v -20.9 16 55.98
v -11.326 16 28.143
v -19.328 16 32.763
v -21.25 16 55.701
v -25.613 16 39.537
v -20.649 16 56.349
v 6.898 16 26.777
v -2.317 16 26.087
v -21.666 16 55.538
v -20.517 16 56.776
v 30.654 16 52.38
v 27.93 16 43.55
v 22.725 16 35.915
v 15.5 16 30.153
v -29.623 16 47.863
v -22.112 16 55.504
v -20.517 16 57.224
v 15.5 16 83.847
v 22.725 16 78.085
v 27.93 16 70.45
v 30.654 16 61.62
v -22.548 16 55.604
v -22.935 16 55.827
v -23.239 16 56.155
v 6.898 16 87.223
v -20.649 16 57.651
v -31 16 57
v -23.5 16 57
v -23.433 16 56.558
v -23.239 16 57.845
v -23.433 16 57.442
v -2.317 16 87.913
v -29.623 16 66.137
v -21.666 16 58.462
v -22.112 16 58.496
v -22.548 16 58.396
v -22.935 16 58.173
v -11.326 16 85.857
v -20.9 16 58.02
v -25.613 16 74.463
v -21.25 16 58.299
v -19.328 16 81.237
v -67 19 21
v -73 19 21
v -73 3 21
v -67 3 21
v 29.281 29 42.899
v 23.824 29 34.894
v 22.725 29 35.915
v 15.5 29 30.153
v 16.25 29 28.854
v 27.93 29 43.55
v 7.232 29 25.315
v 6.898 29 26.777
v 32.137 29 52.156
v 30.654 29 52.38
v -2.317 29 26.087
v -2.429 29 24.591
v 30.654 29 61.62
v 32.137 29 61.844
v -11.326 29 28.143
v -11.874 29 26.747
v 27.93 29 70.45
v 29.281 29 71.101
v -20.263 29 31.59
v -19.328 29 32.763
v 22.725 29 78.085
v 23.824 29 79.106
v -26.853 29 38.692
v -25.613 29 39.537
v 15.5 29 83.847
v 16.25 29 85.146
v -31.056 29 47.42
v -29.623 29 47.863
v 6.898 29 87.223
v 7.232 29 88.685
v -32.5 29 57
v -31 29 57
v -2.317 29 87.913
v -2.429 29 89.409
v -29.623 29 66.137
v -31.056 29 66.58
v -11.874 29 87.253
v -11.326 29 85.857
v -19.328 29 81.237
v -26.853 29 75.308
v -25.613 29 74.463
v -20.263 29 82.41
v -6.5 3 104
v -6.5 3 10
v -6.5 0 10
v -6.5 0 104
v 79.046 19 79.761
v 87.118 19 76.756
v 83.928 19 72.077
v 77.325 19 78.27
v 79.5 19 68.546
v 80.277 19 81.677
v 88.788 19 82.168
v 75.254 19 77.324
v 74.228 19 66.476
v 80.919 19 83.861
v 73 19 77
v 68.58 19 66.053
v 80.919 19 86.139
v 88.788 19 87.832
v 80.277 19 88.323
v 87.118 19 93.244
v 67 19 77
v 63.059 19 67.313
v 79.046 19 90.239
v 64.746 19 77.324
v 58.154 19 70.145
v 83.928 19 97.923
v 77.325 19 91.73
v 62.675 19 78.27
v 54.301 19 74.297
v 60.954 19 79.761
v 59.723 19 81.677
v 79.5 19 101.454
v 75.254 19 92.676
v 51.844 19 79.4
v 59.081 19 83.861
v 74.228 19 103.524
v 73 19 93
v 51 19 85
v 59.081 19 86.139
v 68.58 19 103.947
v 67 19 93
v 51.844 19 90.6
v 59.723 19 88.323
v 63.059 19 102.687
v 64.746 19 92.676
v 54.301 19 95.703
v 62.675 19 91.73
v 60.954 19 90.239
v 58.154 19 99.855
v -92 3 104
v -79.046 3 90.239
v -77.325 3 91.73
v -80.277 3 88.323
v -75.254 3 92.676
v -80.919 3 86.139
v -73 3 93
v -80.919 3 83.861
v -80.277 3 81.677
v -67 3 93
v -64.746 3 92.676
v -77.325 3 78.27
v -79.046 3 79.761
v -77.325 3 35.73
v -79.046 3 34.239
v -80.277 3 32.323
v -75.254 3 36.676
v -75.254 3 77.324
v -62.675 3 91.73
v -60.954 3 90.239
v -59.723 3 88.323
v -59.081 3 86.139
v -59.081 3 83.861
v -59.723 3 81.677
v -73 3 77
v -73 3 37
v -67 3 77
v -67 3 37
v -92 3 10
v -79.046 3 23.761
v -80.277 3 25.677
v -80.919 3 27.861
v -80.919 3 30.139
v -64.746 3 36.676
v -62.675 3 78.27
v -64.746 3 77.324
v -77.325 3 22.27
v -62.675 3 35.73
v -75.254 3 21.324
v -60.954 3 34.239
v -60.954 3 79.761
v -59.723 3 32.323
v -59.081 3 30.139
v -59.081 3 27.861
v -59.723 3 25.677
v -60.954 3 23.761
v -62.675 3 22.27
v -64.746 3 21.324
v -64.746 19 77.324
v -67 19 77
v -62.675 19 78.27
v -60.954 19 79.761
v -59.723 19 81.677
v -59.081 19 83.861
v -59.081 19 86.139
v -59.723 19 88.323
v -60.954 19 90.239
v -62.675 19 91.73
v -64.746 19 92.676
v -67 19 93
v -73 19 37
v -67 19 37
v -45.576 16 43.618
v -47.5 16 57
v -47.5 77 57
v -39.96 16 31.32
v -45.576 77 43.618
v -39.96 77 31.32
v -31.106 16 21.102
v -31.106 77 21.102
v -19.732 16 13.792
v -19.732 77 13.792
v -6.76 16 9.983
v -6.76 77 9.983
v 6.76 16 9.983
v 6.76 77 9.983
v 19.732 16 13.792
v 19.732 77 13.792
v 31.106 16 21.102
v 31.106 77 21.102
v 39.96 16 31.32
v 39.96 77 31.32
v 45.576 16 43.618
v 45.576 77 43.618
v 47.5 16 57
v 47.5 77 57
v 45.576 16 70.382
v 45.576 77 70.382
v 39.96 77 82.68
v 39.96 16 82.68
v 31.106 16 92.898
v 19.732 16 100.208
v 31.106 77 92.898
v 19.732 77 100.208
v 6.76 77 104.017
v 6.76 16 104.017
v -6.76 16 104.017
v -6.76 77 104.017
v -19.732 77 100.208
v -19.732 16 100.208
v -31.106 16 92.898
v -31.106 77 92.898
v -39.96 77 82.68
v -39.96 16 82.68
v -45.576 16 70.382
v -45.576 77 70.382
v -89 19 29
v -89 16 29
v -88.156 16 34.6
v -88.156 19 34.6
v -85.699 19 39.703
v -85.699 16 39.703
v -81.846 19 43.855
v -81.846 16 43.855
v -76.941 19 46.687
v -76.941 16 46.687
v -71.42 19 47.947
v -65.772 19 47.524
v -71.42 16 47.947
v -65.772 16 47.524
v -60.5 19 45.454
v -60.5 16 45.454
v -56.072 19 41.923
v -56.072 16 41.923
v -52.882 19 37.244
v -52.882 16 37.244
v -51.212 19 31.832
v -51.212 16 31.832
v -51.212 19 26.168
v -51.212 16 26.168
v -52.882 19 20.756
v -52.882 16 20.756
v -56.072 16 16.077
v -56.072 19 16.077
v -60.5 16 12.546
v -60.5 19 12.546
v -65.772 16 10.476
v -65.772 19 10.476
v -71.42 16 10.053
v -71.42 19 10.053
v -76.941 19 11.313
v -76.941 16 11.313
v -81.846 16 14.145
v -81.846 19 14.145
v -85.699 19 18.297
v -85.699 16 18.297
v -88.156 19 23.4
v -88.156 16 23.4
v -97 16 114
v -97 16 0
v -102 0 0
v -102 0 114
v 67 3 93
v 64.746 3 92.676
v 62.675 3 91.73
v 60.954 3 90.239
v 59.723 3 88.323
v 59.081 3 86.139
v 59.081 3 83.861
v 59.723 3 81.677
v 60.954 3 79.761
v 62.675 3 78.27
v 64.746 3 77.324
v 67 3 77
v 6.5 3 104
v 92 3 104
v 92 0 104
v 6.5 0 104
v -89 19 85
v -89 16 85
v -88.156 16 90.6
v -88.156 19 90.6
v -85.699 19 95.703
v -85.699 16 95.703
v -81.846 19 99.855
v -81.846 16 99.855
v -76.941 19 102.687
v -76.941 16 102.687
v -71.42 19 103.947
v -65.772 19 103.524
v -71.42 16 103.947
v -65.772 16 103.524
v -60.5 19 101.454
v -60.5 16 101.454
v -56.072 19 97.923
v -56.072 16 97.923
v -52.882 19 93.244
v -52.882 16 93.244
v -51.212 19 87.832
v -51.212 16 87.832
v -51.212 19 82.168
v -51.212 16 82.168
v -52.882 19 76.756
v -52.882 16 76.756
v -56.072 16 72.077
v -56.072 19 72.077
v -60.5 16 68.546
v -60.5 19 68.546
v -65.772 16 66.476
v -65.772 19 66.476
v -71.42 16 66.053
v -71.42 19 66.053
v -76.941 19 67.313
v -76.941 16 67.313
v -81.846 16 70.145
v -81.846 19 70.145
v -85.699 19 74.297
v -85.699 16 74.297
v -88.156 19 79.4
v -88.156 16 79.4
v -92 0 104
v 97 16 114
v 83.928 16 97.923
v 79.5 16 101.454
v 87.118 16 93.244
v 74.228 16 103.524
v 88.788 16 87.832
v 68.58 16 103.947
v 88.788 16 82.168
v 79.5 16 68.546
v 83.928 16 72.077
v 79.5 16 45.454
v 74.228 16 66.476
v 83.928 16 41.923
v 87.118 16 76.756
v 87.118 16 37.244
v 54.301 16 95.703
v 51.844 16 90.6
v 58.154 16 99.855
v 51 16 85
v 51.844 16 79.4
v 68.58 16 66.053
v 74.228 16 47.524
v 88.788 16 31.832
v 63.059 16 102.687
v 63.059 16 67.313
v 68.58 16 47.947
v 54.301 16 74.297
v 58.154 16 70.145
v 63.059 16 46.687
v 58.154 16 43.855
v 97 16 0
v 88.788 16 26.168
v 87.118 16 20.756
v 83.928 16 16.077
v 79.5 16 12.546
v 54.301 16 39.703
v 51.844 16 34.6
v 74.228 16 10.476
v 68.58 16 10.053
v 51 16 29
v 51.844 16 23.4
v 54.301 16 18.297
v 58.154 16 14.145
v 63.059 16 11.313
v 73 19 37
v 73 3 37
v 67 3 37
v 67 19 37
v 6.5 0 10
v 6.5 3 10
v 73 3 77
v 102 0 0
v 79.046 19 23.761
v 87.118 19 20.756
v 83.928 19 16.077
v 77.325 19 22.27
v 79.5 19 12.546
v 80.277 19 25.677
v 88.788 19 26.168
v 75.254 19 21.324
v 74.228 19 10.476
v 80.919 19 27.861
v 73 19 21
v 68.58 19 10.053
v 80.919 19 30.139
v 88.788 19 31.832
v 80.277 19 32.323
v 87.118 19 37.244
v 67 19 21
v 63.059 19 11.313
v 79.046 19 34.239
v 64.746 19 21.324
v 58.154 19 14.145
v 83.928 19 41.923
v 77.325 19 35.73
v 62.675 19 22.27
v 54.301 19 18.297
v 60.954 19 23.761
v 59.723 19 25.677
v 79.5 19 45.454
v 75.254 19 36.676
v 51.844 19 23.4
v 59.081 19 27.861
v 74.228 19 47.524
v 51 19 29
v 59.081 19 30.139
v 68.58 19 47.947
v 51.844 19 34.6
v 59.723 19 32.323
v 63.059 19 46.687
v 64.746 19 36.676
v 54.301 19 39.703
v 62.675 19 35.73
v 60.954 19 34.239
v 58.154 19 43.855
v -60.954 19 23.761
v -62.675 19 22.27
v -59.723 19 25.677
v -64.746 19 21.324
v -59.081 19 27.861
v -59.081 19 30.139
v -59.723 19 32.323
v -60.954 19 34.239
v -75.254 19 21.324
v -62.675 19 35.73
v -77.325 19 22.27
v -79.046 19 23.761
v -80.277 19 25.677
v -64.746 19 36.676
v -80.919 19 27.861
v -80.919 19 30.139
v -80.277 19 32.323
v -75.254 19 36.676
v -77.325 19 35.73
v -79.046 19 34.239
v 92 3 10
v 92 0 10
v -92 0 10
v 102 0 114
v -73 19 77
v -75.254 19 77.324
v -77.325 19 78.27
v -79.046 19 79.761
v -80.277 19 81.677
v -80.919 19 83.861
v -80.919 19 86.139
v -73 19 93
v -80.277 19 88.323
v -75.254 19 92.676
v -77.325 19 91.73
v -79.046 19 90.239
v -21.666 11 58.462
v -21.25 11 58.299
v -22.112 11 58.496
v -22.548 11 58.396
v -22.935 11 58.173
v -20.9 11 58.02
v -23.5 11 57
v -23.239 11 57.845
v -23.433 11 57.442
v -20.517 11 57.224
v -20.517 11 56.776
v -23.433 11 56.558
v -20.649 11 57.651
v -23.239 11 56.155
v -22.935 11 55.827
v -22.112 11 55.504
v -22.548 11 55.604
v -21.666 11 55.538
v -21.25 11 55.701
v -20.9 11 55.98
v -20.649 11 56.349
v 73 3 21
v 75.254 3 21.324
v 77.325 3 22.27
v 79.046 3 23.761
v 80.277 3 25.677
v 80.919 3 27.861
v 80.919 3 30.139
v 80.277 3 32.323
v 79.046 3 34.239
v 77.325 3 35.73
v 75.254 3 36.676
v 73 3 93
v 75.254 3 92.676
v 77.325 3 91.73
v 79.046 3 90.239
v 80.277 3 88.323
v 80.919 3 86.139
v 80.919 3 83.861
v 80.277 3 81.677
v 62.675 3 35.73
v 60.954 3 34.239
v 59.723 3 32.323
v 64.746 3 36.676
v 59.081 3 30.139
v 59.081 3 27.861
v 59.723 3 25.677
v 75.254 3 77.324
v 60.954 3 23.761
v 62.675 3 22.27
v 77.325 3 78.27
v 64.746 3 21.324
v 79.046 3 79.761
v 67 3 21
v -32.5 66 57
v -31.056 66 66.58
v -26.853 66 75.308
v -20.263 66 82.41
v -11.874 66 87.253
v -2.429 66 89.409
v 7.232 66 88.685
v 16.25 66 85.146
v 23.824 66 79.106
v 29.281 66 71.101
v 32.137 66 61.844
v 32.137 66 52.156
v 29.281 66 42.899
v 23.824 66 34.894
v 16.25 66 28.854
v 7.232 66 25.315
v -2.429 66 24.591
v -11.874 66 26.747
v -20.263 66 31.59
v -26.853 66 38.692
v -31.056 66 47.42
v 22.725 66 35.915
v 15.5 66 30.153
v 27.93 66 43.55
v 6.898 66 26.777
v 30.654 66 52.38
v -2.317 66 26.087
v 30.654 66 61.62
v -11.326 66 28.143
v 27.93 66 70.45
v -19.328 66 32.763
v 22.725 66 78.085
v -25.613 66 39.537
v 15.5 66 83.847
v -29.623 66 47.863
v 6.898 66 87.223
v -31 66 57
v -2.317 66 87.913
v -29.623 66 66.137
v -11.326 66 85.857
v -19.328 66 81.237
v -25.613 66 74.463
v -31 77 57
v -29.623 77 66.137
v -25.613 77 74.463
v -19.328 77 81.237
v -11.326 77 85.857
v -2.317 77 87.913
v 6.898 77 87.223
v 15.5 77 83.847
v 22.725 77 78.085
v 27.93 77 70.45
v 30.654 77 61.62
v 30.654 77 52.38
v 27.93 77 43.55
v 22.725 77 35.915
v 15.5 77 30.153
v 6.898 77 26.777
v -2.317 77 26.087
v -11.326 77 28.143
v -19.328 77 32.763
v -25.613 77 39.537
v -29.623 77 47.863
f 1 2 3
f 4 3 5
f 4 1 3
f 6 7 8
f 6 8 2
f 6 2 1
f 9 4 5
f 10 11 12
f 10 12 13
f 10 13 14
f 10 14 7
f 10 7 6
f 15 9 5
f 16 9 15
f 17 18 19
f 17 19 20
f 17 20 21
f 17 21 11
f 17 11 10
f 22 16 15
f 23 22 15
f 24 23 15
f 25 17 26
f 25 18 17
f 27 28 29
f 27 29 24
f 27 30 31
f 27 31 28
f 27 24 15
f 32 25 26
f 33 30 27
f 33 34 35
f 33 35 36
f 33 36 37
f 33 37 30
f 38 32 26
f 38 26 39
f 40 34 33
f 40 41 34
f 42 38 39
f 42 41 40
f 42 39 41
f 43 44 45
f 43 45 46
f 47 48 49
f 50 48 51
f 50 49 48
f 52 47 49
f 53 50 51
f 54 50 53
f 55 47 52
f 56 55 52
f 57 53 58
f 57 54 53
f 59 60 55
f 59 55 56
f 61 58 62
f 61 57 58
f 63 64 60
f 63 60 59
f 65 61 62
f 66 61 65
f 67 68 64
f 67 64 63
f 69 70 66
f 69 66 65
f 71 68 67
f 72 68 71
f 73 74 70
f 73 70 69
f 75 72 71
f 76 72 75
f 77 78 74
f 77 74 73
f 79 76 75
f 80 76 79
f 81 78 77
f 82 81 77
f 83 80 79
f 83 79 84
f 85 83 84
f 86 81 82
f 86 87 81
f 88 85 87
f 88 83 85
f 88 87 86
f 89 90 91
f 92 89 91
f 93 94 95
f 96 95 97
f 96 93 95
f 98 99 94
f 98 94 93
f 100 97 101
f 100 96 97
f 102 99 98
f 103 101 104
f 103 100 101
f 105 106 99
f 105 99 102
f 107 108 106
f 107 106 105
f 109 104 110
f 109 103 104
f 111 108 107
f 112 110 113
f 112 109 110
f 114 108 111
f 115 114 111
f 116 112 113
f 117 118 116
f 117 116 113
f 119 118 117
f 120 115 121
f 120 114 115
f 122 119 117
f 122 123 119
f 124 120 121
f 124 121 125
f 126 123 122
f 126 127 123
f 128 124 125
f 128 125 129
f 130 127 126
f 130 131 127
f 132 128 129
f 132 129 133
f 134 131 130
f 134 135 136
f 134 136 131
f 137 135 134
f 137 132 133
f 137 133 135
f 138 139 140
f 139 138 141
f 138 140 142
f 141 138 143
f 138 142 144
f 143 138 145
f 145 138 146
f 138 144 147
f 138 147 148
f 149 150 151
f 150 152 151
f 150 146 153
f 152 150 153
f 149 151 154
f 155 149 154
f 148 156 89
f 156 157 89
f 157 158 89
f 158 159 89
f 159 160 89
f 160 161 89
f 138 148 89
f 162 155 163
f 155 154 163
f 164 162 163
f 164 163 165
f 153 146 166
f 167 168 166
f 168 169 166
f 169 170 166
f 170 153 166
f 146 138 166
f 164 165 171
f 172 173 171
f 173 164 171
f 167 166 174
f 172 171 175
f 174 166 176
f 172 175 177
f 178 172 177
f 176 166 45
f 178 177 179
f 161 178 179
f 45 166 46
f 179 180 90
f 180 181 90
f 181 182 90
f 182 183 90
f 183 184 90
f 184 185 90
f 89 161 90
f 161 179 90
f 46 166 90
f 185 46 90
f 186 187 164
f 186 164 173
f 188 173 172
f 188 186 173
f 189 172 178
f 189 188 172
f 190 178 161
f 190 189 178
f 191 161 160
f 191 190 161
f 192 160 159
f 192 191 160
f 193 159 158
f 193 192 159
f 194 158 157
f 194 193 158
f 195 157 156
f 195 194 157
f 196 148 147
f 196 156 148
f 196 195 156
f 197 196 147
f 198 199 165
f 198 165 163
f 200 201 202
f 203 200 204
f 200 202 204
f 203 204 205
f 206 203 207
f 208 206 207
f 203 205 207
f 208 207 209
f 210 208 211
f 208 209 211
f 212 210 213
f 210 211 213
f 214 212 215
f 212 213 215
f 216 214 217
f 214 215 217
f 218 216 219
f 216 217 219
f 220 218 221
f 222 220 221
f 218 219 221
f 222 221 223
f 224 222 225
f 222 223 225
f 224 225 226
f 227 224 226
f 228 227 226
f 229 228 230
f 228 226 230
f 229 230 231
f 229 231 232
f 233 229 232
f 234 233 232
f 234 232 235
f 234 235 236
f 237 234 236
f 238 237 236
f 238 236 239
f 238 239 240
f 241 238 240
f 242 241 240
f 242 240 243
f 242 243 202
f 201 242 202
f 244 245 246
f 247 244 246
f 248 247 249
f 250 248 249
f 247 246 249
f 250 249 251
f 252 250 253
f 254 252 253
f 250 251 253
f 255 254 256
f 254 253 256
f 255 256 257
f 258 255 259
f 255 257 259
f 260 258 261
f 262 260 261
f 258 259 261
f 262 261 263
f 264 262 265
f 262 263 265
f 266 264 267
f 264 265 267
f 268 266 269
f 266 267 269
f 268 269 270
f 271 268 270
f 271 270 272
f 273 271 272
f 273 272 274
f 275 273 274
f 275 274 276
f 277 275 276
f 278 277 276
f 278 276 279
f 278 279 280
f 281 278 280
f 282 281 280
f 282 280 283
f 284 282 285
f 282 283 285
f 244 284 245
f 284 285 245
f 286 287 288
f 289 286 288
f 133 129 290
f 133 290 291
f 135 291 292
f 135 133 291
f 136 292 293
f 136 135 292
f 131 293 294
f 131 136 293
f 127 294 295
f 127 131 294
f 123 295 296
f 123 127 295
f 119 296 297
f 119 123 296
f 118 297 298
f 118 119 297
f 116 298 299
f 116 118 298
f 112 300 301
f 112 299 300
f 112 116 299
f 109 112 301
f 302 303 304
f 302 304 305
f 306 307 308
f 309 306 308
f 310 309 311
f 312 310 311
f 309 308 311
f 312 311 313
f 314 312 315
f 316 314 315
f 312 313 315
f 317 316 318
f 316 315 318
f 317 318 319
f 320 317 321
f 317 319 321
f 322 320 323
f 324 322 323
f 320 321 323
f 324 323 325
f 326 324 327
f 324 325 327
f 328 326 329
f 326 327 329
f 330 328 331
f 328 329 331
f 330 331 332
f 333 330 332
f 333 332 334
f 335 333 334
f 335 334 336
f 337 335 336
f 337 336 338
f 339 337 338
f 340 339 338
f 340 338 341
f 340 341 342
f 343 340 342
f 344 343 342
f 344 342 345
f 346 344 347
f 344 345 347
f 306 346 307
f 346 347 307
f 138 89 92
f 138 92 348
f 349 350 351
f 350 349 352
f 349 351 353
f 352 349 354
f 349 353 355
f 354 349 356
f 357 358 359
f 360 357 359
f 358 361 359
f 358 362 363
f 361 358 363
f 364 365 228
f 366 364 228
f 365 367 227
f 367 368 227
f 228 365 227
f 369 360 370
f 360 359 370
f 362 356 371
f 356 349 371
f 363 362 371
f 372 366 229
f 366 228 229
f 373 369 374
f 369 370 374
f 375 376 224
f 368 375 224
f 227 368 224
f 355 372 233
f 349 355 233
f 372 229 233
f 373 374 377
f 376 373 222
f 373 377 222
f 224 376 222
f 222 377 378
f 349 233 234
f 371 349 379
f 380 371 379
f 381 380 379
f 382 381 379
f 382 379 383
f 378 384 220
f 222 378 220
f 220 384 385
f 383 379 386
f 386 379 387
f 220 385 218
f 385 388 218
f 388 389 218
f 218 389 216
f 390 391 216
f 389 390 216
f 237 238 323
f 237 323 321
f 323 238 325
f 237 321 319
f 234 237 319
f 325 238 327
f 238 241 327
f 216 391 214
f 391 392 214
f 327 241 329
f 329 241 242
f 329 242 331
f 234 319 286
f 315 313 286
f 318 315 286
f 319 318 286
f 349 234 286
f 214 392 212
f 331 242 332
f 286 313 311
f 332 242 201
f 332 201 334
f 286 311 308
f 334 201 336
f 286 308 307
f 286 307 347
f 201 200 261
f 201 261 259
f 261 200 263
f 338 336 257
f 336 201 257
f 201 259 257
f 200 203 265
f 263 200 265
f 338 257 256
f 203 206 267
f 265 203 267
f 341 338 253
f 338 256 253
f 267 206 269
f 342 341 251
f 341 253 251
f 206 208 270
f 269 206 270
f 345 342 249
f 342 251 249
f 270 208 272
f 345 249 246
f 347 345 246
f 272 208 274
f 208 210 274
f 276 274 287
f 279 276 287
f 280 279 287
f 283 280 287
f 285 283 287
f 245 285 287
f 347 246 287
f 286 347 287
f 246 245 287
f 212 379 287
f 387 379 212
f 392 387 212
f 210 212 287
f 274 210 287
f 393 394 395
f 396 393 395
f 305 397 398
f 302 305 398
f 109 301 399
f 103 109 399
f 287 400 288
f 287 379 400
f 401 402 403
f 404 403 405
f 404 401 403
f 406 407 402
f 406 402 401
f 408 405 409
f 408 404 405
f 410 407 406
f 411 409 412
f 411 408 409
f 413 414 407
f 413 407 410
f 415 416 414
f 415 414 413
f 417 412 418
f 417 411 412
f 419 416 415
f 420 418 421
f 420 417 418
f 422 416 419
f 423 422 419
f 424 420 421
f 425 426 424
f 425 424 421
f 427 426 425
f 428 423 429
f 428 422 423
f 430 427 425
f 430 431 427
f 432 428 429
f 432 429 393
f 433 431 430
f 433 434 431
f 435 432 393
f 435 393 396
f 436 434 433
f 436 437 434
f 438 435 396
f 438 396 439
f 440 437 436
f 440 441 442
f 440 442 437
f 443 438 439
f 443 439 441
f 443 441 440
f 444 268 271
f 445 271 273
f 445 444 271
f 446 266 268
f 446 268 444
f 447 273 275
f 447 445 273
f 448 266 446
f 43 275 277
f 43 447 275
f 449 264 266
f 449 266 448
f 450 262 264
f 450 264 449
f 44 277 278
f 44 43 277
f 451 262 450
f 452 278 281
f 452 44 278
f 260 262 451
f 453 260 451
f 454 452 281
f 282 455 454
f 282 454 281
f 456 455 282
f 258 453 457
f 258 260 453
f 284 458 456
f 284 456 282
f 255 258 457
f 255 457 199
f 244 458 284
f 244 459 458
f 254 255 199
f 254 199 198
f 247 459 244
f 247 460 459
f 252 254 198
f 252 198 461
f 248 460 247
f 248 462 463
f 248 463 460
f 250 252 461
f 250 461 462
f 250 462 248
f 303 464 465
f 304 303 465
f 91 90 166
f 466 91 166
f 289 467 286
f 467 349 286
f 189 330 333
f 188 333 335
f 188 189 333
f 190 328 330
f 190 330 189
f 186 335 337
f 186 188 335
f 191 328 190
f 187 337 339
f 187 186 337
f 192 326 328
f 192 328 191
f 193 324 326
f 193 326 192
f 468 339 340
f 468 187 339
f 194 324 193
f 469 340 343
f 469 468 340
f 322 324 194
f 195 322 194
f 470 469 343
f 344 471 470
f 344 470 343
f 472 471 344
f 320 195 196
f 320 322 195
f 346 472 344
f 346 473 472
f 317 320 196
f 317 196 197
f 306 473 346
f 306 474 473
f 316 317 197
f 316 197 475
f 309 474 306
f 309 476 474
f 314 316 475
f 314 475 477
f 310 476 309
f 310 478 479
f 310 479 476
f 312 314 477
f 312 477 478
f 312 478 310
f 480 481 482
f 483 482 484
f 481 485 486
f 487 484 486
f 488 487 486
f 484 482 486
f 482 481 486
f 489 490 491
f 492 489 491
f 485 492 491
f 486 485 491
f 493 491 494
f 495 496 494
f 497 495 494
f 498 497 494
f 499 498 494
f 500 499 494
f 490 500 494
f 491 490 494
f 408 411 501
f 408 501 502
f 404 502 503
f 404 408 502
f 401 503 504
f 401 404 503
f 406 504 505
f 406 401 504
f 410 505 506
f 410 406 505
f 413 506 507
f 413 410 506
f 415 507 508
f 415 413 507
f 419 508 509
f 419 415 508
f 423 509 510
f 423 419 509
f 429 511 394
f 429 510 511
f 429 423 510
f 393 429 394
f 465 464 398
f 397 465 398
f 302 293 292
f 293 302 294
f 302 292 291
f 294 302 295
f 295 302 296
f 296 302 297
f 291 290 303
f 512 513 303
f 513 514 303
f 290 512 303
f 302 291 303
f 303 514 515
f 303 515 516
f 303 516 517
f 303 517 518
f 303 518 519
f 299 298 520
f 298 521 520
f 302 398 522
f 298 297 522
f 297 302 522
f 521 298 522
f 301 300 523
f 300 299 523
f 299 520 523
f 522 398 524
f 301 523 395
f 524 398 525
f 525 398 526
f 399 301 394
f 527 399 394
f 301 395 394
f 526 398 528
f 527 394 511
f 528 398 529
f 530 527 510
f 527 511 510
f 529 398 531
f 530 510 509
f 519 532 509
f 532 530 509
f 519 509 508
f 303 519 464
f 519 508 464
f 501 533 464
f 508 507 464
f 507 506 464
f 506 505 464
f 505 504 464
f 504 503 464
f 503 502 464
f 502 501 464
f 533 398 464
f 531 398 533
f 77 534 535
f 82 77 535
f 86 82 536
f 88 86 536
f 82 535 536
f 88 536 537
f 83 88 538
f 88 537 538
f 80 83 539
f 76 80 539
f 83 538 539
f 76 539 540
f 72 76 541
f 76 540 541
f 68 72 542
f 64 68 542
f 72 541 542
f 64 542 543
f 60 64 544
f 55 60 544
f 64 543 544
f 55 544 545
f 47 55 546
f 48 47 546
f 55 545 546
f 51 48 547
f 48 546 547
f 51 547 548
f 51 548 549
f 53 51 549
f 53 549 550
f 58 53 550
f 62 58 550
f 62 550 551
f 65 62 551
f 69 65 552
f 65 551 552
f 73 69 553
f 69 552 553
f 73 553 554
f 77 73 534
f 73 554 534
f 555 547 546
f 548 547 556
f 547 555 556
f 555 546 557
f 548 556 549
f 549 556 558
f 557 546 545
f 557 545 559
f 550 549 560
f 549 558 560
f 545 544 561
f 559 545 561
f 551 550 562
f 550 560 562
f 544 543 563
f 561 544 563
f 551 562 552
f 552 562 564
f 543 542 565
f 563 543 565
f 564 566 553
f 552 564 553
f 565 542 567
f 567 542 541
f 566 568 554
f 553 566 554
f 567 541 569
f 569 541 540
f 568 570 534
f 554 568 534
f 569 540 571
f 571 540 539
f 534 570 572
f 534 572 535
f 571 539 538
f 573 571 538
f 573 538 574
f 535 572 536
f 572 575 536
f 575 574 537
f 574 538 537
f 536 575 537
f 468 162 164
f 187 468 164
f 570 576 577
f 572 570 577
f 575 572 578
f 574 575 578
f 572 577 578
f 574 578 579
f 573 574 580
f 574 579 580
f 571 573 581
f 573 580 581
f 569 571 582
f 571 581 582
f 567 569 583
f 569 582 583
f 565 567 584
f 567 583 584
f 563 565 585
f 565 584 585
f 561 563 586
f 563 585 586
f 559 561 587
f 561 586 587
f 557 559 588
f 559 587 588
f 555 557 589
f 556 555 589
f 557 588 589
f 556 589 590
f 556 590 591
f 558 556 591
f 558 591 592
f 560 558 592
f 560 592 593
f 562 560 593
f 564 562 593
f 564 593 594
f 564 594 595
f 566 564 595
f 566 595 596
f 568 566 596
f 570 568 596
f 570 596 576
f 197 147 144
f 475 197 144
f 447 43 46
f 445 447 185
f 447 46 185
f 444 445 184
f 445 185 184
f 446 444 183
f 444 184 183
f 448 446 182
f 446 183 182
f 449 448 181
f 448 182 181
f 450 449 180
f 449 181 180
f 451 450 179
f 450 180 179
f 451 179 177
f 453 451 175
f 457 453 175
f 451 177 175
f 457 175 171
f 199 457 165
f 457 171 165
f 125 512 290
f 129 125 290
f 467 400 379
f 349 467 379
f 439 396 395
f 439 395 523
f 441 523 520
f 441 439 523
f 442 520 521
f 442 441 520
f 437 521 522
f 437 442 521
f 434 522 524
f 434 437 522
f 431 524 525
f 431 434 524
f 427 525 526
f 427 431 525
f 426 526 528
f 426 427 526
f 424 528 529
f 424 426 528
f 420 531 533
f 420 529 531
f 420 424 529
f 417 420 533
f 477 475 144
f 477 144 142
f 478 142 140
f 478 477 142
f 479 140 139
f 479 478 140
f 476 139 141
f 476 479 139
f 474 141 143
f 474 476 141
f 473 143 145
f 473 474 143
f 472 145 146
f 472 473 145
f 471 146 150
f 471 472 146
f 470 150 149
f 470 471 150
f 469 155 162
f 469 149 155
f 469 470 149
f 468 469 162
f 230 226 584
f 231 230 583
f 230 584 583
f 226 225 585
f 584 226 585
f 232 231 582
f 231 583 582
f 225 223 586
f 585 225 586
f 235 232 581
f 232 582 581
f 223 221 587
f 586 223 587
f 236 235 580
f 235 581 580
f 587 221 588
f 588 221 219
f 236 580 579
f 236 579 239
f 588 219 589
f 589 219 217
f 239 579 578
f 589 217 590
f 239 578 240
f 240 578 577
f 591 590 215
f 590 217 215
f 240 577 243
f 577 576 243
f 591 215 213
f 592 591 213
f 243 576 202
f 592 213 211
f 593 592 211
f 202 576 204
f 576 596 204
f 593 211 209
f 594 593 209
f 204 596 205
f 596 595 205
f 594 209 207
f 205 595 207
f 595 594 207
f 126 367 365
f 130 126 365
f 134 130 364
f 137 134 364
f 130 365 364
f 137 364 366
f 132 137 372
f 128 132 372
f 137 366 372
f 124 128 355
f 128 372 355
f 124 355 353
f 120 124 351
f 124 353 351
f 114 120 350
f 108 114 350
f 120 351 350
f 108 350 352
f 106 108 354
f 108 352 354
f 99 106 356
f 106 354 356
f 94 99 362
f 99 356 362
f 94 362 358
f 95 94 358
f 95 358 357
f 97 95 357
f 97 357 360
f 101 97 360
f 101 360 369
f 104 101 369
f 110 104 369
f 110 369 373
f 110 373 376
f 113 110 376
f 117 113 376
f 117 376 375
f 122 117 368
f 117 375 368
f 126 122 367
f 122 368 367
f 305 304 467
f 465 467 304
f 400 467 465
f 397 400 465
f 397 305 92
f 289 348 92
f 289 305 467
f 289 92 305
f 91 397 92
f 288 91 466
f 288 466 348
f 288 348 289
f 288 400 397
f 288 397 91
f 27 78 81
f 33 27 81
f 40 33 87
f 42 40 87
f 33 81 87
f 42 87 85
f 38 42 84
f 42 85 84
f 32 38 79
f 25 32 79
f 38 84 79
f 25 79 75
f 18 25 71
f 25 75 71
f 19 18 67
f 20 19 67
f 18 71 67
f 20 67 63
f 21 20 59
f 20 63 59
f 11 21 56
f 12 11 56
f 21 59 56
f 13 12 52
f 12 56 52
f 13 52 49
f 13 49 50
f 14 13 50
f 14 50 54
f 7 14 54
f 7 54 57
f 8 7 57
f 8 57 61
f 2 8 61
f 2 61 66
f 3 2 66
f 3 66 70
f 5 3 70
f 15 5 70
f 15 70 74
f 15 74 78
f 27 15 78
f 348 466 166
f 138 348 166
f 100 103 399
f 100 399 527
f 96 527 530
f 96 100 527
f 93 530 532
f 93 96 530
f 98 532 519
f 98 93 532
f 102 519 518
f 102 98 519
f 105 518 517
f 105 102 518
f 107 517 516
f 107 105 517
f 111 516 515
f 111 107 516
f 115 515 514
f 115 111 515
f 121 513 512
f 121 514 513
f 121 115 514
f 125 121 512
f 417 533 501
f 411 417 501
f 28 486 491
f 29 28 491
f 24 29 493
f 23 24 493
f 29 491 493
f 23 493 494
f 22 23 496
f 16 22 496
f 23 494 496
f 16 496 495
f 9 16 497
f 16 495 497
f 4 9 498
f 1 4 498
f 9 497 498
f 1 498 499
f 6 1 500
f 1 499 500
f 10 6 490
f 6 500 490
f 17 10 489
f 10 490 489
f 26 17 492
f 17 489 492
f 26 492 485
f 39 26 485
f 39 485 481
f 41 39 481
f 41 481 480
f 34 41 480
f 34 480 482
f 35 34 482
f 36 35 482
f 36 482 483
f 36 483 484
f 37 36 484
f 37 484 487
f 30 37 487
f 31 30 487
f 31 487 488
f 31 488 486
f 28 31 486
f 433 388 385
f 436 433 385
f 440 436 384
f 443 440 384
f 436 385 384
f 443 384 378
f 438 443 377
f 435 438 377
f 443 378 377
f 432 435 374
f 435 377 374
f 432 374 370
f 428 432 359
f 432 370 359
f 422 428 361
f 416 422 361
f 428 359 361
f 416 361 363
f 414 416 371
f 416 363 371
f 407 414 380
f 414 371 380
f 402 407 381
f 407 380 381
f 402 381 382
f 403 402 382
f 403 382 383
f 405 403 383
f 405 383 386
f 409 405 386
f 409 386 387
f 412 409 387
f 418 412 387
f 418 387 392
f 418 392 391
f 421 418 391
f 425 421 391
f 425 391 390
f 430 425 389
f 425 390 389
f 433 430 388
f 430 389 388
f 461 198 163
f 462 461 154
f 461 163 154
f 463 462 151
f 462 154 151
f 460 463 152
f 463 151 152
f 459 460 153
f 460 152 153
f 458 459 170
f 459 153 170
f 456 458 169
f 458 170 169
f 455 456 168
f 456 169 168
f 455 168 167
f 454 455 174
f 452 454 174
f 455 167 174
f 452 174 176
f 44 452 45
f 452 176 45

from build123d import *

# Parameters (mm, degrees)
BOSS_EXTRUDE1_DEPTH       = 114
SKETCH2_R                 = 31
CUT_EXTRUDE1_DEPTH        = 61
CUT_EXTRUDE2_DEPTH        = 61
SKETCH5_R                 = 32.5
CUT_EXTRUDE3_DEPTH        = 37
CUT_EXTRUDE4_DEPTH        = 17
SKETCH7_R                 = 19
BOSS_EXTRUDE3_DEPTH       = 3
SKETCH8_W                 = 85.5
SKETCH8_H                 = 10
BOSS_EXTRUDE4_DEPTH       = 3
SKETCH9_W                 = 85.5
SKETCH9_H                 = 10
BOSS_EXTRUDE5_DEPTH       = 3
F_3_0MM_DOWEL_HOLE1_D     = 3
F_3_0MM_DOWEL_HOLE1_DEPTH = 5


with BuildPart() as part:
    # Sketch1 → Boss-Extrude1 (new body)
    with BuildSketch(Plane.XY):
        Polygon((-6.5, 3), (-6.5, 0), (0, 0), (0, 77), (-47.5, 77), (-47.5, 16), (-97, 16), (-102, 0), (-92, 0), (-92, 3), align=None)
        Polygon((0, 77), (0, 0), (6.5, 0), (6.5, 3), (92, 3), (92, 0), (102, 0), (97, 16), (47.5, 16), (47.5, 77), align=None)
    extrude(amount=BOSS_EXTRUDE1_DEPTH)

    # Sketch2 → Cut-Extrude1 (cut)
    with BuildSketch(Plane(origin=(0, 77, 0), x_dir=(1, 0, 0), z_dir=(0, 1, 0))):
        with Locations(Location((0, -57, 0), (0, 0, 180))):  # turned: the seam where the file's is
            Circle(SKETCH2_R)
    extrude(amount=-CUT_EXTRUDE1_DEPTH, mode=Mode.SUBTRACT)

    # Sketch3 → Cut-Extrude2 (cut)
    with BuildSketch(Plane(origin=(0, 77, 0), x_dir=(1, 0, 0), z_dir=(0, 1, 0))):
        with BuildLine():
            Line((-47.5, 0), (-47.5, -57))
            ThreePointArc((-47.5, -57), (0, -9.5), (47.5, -57))
            Line((47.5, -57), (47.5, 0))
            Line((47.5, 0), (-47.5, 0))
        make_face()
        with BuildLine():
            ThreePointArc((47.5, -57), (0, -104.5), (-47.5, -57))
            Line((-47.5, -57), (-47.5, -114))
            Line((-47.5, -114), (47.5, -114))
            Line((47.5, -114), (47.5, -57))
        make_face()
    extrude(amount=-CUT_EXTRUDE2_DEPTH, mode=Mode.SUBTRACT)

    # Sketch5 → Cut-Extrude3 (cut)
    with BuildSketch(Plane(origin=(0, 66, 0), x_dir=(1, 0, 0), z_dir=(0, 1, 0))):
        with Locations(Location((0, -57, 0), (0, 0, 180))):  # turned: the seam where the file's is
            Circle(SKETCH5_R)
    extrude(amount=-CUT_EXTRUDE3_DEPTH, mode=Mode.SUBTRACT)

    # Sketch6 → Cut-Extrude4 (cut, through all)
    with BuildSketch(Plane(origin=(0, 16, 0), x_dir=(1, 0, 0), z_dir=(0, 1, 0))):
        with BuildLine():
            Line((-73, -21), (-67, -21))
            ThreePointArc((-67, -21), (-59, -29), (-67, -37))
            Line((-67, -37), (-73, -37))
            ThreePointArc((-73, -37), (-81, -29), (-73, -21))
        make_face()
        with BuildLine():
            Line((67, -21), (73, -21))
            ThreePointArc((73, -21), (81, -29), (73, -37))
            Line((73, -37), (67, -37))
            ThreePointArc((67, -37), (59, -29), (67, -21))
        make_face()
        with BuildLine():
            Line((67, -77), (73, -77))
            ThreePointArc((73, -77), (81, -85), (73, -93))
            Line((73, -93), (67, -93))
            ThreePointArc((67, -93), (59, -85), (67, -77))
        make_face()
        with BuildLine():
            Line((-73, -77), (-67, -77))
            ThreePointArc((-67, -77), (-59, -85), (-67, -93))
            Line((-67, -93), (-73, -93))
            ThreePointArc((-73, -93), (-81, -85), (-73, -77))
        make_face()
    extrude(amount=-CUT_EXTRUDE4_DEPTH, mode=Mode.SUBTRACT)

    # Sketch7 → Boss-Extrude3 (add)
    with BuildSketch(Plane(origin=(0, 16, 0), x_dir=(1, 0, 0), z_dir=(0, 1, 0))):
        with Locations(Location((-70, -29, 0), (0, 0, 180))):  # turned: the seam where the file's is
            Circle(SKETCH7_R)
        with BuildLine():
            Line((-67, -37), (-73, -37))
            ThreePointArc((-73, -37), (-81, -29), (-73, -21))
            Line((-73, -21), (-67, -21))
            ThreePointArc((-67, -21), (-59, -29), (-67, -37))
        make_face(mode=Mode.SUBTRACT)
        with Locations(Location((70, -29, 0), (0, 0, 180))):  # turned: the seam where the file's is
            Circle(SKETCH7_R)
        with BuildLine():
            Line((73, -37), (67, -37))
            ThreePointArc((67, -37), (59, -29), (67, -21))
            Line((67, -21), (73, -21))
            ThreePointArc((73, -21), (81, -29), (73, -37))
        make_face(mode=Mode.SUBTRACT)
        with Locations(Location((70, -85, 0), (0, 0, 180))):  # turned: the seam where the file's is
            Circle(SKETCH7_R)
        with BuildLine():
            Line((73, -93), (67, -93))
            ThreePointArc((67, -93), (59, -85), (67, -77))
            Line((67, -77), (73, -77))
            ThreePointArc((73, -77), (81, -85), (73, -93))
        make_face(mode=Mode.SUBTRACT)
        with Locations(Location((-70, -85, 0), (0, 0, 180))):  # turned: the seam where the file's is
            Circle(SKETCH7_R)
        with BuildLine():
            Line((-67, -93), (-73, -93))
            ThreePointArc((-73, -93), (-81, -85), (-73, -77))
            Line((-73, -77), (-67, -77))
            ThreePointArc((-67, -77), (-59, -85), (-67, -93))
        make_face(mode=Mode.SUBTRACT)
    extrude(amount=BOSS_EXTRUDE3_DEPTH)

    # Sketch8 → Boss-Extrude4 (add)
    with BuildSketch(Plane(origin=(0, 3, 0), x_dir=(-1, 0, 0), z_dir=(0, -1, 0))):
        with Locations((49.25, -5)):
            Rectangle(SKETCH8_W, SKETCH8_H)
        with Locations((49.25, -109)):
            Rectangle(SKETCH8_W, SKETCH8_H)
    extrude(amount=BOSS_EXTRUDE4_DEPTH)

    # Sketch9 → Boss-Extrude5 (add)
    with BuildSketch(Plane(origin=(0, 3, 0), x_dir=(-1, 0, 0), z_dir=(0, -1, 0))):
        with Locations((-49.25, -109)):
            Rectangle(SKETCH9_W, SKETCH9_H)
        with Locations((-49.25, -5)):
            Rectangle(SKETCH9_W, SKETCH9_H)
    extrude(amount=BOSS_EXTRUDE5_DEPTH)

    # Ø3.0mm Dowel Hole1
    with Locations(Plane(origin=(0, 16, 0), x_dir=(1, 0, 0), z_dir=(0, 1, 0))):
        with Locations((-22, -57)):
            Hole(F_3_0MM_DOWEL_HOLE1_D / 2, depth=F_3_0MM_DOWEL_HOLE1_DEPTH)


solid = part.part
